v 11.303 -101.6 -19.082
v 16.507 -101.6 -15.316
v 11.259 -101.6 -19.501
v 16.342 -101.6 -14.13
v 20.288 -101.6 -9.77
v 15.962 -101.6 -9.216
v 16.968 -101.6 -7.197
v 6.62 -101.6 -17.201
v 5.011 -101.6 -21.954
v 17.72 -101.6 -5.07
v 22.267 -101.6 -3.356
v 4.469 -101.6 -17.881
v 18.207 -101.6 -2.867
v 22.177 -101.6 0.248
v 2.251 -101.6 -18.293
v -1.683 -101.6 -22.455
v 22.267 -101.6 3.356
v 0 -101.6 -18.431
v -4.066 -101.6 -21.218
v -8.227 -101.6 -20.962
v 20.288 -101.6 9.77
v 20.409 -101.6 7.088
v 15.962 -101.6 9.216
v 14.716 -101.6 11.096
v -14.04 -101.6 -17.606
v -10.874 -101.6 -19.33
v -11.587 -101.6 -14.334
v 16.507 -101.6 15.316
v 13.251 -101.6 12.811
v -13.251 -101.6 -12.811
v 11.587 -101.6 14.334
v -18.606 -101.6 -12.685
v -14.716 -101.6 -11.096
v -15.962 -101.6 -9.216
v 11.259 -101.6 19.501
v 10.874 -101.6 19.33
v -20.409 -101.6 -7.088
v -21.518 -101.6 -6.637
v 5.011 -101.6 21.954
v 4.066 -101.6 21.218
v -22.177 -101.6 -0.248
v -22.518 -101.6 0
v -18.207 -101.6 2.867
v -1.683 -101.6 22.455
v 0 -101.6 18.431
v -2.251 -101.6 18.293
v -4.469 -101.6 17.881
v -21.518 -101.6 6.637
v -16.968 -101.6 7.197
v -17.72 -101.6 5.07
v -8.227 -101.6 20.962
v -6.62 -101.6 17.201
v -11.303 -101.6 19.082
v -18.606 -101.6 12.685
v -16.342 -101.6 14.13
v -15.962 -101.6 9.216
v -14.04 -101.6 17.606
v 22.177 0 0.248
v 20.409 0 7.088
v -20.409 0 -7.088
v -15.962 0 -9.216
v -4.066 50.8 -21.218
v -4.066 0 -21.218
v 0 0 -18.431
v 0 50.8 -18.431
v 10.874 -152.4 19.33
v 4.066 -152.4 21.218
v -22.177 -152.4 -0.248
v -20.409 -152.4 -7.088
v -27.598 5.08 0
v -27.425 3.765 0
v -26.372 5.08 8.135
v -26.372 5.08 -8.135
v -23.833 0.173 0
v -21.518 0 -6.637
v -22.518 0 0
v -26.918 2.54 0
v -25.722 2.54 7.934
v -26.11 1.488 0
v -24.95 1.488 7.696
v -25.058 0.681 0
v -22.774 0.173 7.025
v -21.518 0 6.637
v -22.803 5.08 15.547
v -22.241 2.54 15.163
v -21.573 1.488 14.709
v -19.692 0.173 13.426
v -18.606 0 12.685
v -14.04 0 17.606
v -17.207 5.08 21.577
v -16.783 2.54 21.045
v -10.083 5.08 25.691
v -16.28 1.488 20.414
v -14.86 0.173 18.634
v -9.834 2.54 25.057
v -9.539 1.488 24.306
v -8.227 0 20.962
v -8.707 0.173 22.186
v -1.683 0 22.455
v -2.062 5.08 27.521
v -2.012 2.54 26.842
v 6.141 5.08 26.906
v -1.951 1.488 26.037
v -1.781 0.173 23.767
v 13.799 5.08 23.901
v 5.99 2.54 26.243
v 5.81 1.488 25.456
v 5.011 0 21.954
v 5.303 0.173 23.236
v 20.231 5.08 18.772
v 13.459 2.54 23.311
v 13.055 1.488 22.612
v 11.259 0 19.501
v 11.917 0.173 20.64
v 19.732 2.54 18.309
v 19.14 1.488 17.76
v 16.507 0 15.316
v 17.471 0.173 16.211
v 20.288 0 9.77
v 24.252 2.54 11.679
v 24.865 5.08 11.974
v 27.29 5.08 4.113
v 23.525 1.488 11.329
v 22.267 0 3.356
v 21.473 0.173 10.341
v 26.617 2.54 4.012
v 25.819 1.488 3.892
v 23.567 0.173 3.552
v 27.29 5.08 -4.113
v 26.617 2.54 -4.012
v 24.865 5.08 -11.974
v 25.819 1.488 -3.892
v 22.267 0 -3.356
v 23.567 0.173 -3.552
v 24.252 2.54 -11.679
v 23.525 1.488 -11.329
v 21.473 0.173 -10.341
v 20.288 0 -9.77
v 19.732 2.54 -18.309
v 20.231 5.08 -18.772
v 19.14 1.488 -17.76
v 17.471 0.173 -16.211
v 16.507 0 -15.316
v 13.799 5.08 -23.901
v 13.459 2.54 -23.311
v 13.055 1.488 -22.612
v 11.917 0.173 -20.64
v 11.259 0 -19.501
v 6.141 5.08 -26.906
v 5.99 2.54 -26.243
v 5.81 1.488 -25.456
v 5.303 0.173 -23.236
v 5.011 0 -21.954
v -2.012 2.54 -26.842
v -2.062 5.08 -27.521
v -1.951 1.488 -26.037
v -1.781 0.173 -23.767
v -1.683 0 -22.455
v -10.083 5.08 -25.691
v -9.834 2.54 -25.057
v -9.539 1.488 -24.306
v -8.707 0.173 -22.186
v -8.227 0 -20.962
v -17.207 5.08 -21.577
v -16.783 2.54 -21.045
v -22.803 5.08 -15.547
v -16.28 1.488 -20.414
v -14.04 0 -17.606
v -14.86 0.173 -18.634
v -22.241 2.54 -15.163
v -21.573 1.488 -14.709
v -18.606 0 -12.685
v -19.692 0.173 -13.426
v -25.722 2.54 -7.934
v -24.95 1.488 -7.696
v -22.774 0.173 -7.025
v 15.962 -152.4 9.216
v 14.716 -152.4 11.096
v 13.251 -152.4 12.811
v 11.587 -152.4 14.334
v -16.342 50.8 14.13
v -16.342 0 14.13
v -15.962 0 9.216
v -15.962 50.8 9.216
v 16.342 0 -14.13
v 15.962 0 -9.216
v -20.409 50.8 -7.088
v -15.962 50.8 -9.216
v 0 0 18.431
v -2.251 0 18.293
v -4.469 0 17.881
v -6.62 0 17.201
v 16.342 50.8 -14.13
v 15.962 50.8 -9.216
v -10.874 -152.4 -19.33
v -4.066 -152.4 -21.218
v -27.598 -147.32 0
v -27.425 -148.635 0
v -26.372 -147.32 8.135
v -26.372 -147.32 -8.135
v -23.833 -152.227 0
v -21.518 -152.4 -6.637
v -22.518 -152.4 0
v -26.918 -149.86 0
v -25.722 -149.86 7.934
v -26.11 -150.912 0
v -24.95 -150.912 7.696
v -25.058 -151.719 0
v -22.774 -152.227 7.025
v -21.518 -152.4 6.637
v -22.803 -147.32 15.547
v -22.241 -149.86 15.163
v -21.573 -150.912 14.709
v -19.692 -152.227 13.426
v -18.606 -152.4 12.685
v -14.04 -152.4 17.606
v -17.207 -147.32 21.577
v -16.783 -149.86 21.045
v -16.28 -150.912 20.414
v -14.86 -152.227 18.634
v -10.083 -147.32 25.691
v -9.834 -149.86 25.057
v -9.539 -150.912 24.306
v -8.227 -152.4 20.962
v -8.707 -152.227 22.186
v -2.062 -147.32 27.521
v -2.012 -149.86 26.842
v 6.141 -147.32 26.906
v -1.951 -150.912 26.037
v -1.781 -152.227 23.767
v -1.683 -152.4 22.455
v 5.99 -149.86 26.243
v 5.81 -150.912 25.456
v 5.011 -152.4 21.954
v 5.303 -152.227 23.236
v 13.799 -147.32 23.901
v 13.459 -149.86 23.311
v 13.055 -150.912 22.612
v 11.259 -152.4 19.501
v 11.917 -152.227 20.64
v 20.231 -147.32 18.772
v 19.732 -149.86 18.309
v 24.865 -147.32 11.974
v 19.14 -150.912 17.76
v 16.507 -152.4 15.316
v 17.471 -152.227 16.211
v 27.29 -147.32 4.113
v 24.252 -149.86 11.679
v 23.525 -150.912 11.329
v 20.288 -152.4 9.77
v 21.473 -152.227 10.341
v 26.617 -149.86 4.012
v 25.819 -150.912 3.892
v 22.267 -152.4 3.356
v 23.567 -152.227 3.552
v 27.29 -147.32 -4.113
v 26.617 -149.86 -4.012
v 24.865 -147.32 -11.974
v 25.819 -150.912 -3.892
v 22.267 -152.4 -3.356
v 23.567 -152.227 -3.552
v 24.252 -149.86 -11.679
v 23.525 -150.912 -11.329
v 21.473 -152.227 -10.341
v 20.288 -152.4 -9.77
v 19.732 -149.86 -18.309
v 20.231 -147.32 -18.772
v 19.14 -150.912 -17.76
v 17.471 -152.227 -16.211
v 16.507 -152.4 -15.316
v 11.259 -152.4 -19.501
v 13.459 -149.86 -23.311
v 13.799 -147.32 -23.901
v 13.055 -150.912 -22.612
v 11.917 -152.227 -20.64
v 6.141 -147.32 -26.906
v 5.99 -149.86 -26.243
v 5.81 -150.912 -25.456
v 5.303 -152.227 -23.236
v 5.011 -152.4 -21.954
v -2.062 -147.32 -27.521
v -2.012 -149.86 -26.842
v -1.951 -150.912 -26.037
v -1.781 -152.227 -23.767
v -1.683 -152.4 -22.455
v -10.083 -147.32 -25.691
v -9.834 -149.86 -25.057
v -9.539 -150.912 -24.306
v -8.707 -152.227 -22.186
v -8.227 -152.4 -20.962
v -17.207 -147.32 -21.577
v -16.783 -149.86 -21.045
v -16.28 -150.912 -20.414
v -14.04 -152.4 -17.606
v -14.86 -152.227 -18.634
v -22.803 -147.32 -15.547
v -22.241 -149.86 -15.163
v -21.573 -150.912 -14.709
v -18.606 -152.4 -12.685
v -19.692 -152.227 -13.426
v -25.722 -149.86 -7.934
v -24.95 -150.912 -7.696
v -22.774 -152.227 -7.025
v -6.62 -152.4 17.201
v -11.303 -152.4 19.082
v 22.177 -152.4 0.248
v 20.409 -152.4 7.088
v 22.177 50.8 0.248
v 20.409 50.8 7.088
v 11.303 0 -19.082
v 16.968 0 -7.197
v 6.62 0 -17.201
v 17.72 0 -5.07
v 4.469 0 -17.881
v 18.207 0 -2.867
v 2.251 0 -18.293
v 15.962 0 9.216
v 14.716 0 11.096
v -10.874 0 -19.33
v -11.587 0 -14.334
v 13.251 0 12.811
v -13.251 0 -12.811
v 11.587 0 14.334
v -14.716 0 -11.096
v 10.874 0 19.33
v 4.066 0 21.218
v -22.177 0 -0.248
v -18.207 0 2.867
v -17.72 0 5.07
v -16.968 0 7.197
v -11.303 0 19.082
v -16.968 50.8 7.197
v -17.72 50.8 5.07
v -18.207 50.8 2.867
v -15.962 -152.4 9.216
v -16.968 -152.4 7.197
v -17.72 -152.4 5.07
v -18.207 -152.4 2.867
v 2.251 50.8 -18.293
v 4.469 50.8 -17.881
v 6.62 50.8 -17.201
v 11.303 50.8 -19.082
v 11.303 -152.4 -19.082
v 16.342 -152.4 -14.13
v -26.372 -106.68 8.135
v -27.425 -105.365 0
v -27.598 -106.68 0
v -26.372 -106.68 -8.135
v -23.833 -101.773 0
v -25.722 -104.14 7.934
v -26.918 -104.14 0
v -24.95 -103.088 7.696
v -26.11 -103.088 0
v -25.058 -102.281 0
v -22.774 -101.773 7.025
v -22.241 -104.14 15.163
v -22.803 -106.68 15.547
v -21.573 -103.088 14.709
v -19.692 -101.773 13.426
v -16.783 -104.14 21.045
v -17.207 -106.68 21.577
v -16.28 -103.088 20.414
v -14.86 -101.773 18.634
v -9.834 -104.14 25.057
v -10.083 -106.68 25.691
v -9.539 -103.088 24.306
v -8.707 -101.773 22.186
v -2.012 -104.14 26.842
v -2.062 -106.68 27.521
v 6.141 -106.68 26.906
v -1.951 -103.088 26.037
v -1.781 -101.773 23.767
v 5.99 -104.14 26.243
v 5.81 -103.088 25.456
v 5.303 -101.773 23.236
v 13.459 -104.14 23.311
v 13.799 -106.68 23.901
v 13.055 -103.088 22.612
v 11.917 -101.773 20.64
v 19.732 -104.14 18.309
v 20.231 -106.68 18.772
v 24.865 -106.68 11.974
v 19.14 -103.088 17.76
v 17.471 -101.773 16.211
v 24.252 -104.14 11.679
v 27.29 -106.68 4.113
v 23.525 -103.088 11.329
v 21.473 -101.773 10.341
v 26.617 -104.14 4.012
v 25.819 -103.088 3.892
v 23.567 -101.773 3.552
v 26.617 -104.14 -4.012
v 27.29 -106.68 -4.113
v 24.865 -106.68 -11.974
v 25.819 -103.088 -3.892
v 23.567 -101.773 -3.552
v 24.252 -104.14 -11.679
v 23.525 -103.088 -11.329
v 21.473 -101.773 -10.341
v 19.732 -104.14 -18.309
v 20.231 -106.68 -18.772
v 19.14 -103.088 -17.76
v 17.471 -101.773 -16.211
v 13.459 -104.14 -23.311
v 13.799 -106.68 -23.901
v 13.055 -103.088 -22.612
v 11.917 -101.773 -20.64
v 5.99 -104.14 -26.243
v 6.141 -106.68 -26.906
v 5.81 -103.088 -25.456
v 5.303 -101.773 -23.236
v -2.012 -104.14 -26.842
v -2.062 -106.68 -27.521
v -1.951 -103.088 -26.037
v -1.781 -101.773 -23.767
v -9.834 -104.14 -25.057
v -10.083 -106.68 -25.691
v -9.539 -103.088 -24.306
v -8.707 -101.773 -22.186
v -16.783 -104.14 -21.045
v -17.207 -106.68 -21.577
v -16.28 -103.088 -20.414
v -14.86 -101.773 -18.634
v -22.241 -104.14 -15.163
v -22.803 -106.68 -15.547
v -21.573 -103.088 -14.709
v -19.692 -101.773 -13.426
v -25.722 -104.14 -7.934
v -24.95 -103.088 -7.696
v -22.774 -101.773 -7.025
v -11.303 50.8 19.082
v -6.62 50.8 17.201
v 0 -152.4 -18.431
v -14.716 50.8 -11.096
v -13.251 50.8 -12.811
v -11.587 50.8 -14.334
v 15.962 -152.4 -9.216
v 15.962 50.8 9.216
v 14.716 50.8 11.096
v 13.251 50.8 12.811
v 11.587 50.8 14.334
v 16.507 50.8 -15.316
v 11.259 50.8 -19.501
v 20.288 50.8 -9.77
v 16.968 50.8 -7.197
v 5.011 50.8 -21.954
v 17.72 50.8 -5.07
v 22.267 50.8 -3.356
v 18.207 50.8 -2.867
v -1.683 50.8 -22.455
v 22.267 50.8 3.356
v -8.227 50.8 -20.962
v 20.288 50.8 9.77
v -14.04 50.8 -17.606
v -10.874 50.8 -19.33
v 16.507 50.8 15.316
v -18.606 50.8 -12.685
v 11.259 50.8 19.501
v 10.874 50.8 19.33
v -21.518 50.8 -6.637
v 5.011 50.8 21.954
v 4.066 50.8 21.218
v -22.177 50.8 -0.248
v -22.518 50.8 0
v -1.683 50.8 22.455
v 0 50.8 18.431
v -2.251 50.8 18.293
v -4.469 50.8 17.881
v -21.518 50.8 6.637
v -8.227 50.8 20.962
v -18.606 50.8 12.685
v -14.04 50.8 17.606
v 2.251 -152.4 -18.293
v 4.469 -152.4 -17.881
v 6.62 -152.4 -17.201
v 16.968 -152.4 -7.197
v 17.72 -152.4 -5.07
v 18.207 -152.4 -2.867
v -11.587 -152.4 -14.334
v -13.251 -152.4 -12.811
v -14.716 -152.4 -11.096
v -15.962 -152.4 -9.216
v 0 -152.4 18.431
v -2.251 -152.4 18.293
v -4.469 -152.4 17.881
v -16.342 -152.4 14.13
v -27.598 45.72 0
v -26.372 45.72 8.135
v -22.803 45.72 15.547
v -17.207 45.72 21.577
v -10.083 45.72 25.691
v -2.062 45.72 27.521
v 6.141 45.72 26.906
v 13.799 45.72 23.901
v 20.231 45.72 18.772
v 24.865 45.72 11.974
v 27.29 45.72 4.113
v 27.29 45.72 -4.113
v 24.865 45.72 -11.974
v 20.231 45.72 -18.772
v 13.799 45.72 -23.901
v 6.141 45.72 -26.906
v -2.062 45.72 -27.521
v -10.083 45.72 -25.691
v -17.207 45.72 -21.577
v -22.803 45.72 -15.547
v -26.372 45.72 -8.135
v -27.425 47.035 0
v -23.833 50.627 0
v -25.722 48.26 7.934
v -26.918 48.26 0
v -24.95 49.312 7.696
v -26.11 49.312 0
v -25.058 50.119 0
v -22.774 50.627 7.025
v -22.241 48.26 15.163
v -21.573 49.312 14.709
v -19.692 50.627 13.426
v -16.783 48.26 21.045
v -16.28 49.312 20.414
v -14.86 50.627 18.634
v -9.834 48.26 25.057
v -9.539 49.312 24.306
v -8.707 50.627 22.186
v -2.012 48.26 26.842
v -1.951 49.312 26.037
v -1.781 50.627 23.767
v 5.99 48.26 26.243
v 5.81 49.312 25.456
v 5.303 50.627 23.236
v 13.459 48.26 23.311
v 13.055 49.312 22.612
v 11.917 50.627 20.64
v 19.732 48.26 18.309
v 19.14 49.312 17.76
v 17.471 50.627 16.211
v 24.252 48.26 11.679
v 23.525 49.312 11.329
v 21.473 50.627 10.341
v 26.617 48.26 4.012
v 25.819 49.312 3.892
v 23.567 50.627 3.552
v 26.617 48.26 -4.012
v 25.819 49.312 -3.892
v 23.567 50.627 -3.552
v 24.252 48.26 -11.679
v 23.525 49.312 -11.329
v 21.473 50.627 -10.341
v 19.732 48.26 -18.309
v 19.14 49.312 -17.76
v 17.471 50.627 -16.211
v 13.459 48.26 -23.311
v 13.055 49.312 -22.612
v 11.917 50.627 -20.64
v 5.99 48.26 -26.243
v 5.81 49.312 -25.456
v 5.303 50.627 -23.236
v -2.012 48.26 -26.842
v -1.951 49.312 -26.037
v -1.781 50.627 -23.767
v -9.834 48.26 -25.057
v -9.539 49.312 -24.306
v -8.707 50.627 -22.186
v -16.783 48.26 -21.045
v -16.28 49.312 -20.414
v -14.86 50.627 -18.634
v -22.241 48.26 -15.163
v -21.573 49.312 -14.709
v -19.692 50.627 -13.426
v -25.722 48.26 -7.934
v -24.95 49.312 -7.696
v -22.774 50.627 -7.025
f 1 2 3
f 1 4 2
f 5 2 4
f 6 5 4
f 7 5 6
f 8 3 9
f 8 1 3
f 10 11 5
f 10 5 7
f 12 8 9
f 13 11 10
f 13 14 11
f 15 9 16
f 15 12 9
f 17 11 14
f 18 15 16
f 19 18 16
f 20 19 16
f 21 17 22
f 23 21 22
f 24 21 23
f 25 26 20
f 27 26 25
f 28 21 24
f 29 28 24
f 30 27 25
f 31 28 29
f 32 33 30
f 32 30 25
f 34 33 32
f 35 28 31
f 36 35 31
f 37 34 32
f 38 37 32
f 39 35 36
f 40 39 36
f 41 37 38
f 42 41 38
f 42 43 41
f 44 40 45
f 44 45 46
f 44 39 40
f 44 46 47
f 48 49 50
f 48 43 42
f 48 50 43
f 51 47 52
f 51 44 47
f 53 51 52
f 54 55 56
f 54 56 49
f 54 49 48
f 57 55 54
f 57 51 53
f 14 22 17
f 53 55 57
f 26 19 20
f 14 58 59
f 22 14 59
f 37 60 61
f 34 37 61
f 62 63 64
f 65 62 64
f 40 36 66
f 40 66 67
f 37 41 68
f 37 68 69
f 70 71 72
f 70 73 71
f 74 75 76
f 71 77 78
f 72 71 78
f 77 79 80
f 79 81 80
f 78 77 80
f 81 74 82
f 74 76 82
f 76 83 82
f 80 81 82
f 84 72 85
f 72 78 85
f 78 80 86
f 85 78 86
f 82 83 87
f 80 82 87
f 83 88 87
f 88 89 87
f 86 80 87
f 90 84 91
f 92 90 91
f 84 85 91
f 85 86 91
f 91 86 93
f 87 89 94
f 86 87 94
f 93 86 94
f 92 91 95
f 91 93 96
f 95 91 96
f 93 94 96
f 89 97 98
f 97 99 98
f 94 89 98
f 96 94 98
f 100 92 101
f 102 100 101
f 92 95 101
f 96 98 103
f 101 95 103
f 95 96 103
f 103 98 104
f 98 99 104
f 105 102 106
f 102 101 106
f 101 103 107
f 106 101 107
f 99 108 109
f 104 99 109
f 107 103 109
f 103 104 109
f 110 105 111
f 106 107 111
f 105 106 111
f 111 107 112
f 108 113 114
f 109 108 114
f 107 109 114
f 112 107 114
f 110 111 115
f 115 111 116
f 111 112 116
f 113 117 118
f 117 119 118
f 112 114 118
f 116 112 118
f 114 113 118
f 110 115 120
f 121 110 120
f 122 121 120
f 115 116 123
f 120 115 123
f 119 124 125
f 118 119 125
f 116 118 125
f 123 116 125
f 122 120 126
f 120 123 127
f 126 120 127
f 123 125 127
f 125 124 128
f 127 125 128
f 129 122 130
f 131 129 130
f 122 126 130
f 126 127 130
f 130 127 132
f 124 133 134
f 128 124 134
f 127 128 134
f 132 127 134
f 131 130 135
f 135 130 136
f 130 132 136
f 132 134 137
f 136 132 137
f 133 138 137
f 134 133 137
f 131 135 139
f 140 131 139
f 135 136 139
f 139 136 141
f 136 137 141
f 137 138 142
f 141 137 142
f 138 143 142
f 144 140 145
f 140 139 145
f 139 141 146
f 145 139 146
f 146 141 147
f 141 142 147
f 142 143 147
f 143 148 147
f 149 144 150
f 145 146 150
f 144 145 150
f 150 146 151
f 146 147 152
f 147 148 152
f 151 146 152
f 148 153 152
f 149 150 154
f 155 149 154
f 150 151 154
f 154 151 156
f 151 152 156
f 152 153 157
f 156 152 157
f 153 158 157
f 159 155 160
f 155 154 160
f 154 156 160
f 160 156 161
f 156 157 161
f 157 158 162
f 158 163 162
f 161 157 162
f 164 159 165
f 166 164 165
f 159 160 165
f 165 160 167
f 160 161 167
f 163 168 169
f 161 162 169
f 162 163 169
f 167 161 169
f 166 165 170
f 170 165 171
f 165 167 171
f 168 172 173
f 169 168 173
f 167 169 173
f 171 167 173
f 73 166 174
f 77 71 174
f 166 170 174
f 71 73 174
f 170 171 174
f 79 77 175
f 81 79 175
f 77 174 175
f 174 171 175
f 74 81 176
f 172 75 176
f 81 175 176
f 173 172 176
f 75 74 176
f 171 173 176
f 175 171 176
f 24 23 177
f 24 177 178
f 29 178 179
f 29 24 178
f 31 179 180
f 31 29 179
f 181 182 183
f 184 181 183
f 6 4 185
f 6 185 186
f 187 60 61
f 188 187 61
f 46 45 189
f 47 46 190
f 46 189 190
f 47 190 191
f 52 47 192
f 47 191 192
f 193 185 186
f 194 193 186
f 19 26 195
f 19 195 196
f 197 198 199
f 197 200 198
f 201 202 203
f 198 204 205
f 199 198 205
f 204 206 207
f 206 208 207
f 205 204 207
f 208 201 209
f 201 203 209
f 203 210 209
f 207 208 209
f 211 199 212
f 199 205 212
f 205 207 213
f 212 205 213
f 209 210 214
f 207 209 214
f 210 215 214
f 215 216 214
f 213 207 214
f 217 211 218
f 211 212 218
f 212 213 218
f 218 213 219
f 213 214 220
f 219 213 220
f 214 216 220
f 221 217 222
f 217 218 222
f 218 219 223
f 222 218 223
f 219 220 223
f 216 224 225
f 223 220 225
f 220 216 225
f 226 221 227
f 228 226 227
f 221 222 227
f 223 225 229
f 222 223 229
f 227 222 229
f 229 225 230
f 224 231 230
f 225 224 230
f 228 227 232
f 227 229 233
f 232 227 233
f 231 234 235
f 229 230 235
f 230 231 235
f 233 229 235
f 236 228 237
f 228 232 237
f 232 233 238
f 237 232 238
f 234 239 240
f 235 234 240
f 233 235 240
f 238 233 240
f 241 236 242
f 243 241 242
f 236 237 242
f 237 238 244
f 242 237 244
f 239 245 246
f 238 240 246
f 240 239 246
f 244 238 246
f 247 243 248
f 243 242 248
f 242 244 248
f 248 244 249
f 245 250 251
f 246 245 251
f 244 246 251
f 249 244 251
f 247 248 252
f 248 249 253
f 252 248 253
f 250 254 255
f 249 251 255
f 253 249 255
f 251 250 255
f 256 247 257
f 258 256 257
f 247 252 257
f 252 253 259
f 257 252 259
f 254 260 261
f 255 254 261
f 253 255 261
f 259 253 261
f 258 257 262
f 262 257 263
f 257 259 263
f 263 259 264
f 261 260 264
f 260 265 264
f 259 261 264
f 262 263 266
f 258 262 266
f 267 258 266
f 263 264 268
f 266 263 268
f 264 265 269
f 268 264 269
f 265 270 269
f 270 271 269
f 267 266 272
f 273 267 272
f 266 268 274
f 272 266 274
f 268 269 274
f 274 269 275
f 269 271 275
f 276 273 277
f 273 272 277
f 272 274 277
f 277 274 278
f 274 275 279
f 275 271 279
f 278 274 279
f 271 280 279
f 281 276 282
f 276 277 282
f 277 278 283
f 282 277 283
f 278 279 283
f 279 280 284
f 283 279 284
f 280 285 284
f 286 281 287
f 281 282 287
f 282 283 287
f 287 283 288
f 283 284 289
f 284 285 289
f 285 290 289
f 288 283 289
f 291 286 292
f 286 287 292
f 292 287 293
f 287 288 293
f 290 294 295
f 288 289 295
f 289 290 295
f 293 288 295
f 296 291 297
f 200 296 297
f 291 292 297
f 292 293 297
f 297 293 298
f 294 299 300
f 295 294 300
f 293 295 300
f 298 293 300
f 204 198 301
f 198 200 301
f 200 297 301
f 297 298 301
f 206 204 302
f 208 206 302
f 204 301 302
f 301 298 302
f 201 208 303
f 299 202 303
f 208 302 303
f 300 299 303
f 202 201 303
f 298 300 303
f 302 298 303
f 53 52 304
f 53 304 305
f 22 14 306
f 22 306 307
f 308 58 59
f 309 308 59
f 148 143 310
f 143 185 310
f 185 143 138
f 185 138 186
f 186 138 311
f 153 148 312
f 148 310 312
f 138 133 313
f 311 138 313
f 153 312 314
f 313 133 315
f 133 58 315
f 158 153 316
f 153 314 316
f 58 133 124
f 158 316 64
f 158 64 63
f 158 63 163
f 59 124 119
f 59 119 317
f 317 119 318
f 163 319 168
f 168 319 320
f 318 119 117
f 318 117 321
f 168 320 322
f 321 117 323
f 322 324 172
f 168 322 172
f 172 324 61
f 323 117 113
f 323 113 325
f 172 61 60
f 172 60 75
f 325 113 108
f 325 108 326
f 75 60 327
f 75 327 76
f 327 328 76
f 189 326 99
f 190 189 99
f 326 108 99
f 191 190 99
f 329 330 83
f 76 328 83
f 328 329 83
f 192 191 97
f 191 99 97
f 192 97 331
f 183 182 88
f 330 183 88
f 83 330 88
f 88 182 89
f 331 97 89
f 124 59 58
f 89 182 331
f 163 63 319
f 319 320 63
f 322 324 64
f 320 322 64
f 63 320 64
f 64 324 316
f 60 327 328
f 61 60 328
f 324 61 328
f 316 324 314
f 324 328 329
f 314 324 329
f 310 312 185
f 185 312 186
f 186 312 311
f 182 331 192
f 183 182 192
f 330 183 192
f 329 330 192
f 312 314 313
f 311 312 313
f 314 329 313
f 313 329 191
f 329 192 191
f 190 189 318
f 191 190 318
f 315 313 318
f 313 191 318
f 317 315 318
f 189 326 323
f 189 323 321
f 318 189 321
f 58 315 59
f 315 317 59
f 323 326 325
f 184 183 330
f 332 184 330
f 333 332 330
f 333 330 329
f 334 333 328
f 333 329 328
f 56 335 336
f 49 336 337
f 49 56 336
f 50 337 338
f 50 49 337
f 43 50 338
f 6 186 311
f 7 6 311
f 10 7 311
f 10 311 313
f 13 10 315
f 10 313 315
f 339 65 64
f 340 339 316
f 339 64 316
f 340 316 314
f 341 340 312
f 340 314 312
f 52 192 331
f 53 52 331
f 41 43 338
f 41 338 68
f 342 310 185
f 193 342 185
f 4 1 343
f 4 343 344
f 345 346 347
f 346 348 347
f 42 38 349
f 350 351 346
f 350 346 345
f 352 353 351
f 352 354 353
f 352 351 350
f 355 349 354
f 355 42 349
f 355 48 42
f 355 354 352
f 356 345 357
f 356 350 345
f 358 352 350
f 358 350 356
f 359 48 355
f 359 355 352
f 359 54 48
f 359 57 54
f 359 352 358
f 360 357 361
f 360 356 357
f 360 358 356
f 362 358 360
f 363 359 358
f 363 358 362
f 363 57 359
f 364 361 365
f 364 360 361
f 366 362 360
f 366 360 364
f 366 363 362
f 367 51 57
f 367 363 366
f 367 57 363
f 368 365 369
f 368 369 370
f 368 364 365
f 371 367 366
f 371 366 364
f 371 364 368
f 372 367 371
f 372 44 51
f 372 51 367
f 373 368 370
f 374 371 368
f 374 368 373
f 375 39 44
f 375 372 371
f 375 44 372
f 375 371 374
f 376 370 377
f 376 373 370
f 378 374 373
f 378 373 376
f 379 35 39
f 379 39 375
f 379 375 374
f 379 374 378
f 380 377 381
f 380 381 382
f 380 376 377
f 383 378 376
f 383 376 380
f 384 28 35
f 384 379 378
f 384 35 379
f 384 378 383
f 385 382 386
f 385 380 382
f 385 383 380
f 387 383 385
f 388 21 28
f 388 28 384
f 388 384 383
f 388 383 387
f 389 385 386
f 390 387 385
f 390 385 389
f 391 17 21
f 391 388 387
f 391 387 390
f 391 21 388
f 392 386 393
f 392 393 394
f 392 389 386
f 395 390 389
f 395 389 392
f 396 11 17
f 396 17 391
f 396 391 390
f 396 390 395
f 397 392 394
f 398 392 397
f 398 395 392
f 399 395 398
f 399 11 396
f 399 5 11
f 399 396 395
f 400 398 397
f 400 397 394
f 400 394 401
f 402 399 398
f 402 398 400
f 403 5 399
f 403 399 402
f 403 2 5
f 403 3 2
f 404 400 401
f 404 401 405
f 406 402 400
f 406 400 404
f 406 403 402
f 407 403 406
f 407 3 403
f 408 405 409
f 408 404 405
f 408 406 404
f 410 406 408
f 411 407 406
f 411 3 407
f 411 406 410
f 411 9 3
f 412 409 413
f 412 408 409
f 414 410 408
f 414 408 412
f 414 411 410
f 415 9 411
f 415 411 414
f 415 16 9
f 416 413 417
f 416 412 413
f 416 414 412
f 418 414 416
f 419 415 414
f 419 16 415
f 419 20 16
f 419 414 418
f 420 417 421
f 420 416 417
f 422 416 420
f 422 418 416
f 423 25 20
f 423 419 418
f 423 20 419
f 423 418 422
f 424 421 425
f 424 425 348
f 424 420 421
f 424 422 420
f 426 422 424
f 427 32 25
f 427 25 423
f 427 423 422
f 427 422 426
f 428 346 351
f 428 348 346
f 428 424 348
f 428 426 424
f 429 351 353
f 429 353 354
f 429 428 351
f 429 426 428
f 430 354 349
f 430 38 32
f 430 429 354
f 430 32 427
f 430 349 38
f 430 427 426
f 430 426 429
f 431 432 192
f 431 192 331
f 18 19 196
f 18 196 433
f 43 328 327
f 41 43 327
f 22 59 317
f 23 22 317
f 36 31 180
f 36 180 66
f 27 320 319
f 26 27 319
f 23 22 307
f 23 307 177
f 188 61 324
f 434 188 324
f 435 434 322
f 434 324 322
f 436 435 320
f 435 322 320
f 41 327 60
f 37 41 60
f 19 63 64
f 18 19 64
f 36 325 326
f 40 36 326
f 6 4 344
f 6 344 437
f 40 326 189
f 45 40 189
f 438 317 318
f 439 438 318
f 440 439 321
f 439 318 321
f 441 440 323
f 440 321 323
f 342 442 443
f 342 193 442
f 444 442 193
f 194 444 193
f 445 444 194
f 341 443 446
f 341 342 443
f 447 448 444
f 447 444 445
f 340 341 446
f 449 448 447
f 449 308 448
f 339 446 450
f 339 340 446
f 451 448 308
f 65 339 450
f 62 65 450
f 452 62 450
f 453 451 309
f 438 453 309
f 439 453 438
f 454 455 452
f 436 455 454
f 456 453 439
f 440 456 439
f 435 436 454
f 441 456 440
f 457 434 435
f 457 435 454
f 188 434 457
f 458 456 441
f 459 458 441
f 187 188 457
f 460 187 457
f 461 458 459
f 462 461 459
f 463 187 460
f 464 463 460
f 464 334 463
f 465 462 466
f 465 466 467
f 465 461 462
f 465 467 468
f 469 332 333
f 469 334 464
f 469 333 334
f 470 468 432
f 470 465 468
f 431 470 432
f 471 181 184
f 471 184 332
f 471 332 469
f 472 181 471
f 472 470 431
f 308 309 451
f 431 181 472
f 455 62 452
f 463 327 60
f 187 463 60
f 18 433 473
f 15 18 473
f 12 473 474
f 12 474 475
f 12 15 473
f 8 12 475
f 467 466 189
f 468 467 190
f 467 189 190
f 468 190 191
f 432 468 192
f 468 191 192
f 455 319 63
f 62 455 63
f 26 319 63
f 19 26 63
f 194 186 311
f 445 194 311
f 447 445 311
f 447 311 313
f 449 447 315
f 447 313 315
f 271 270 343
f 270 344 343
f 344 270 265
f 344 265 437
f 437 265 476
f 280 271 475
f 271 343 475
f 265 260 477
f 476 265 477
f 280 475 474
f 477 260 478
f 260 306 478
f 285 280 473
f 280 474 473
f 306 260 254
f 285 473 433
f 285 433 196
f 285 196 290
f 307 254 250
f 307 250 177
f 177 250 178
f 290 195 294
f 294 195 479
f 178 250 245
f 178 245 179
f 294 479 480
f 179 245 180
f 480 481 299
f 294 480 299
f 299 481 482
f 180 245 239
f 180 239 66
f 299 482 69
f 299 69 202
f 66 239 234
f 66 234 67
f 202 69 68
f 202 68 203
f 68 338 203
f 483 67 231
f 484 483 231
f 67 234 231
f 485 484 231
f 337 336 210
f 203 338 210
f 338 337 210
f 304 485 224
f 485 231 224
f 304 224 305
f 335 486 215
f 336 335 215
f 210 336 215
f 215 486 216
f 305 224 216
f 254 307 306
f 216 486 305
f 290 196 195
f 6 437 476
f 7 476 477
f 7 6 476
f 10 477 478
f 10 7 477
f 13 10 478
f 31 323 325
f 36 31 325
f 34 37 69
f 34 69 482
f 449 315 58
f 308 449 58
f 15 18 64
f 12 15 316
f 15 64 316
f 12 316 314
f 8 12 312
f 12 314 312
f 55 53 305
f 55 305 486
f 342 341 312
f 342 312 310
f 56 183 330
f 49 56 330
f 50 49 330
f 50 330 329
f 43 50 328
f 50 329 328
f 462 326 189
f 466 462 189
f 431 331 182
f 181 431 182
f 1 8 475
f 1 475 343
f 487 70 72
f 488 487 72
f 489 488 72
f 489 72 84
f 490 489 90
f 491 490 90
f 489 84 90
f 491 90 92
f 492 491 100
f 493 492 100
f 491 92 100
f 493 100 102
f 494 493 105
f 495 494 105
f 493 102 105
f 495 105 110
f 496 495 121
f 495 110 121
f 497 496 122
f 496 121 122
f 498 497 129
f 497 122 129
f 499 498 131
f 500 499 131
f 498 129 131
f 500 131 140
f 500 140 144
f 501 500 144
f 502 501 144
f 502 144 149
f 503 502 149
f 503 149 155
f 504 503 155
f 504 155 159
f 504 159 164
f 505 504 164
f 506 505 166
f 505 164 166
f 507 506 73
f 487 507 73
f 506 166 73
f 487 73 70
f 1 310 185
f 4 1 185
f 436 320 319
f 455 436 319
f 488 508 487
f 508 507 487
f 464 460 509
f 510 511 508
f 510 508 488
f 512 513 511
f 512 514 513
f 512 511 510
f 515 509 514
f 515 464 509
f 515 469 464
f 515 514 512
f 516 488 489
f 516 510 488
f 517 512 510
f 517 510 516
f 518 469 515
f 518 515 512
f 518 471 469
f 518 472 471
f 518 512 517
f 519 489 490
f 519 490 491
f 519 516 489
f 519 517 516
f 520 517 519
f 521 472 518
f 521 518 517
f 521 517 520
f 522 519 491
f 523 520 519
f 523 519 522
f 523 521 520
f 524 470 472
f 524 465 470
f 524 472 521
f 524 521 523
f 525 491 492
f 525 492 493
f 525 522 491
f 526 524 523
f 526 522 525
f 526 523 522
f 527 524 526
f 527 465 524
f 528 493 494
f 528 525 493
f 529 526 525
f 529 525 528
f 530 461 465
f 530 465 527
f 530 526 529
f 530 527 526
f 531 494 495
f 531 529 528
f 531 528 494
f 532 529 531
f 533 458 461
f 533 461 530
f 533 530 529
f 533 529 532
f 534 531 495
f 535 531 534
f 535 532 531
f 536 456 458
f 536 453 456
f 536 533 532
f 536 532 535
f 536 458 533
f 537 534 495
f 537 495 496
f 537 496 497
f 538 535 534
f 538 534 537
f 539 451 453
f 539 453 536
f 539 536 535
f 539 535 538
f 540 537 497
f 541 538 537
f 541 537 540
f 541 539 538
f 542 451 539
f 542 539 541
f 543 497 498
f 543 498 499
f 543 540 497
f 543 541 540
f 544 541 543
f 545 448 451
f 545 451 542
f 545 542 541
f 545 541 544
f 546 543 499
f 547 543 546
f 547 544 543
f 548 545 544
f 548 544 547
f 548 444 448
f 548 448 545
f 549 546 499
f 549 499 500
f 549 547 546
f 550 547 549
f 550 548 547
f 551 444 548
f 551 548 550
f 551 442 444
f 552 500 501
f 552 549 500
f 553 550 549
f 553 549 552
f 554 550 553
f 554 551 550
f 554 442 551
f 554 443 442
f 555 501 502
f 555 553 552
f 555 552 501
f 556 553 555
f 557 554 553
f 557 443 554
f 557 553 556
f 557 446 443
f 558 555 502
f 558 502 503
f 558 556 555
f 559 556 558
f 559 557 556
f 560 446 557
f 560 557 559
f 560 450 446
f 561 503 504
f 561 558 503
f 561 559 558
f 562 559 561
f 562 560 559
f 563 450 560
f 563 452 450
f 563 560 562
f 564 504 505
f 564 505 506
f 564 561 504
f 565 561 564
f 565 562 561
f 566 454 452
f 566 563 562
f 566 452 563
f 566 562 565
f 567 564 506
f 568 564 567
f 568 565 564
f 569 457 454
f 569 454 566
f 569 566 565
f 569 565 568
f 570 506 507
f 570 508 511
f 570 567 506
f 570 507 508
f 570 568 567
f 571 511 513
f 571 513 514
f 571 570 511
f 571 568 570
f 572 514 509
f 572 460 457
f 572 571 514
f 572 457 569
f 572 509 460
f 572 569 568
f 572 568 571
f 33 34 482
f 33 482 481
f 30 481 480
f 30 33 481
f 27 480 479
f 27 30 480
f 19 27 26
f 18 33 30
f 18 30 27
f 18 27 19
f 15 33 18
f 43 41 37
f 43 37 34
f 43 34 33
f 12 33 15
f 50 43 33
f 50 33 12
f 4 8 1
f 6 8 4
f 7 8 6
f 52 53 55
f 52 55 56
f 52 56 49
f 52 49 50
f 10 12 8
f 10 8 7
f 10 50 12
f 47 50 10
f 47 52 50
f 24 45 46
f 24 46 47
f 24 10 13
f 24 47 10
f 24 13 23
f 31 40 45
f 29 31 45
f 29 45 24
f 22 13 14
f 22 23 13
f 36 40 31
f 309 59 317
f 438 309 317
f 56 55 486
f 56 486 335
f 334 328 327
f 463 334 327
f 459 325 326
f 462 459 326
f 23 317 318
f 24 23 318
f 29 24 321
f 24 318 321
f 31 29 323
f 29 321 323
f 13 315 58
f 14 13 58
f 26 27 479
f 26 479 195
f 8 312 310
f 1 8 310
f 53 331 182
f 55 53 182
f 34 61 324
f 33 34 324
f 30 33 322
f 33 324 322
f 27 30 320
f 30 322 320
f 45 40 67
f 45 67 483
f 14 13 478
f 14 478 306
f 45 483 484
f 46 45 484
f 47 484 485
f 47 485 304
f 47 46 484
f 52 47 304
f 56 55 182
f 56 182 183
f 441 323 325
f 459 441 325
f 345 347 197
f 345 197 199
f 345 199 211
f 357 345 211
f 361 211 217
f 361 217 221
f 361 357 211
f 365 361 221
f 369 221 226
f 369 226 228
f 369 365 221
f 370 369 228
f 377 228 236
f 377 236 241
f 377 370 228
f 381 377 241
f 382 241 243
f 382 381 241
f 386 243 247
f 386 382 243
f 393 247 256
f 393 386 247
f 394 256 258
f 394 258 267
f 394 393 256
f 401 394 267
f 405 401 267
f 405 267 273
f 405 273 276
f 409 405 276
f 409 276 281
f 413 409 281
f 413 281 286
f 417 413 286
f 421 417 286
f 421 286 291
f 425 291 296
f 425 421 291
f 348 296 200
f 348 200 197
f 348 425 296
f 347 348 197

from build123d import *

# Parameters (mm, degrees)
F1_DEPTH = 101.6
F2_R     = 27.598358
F3_DEPTH = 50.8
F4_R     = 5.08


with BuildPart() as f1:
    # F0 (on Front) → F1 (new body)
    with BuildSketch(Plane.XZ):
        with BuildLine():
            ThreePointArc((18.206637, -2.867422), (18.374864, -1.438095), (18.431054, 0))
            ThreePointArc((18.431054, 0), (17.803031, 4.770308), (15.961761, 9.215527))
            ThreePointArc((15.961761, 9.215527), (14.009878, 11.976104), (11.586579, 14.3337))
            ThreePointArc((11.586579, 14.3337), (6.144858, 17.376549), (0, 18.431054))
            ThreePointArc((0, 18.431054), (-3.366672, 18.120962), (-6.620059, 17.201121))
            ThreePointArc((-6.620059, 17.201121), (-11.976104, 14.009878), (-15.961761, 9.215527))
            ThreePointArc((-15.961761, 9.215527), (-17.376549, 6.144858), (-18.206637, 2.867422))
            ThreePointArc((-18.206637, 2.867422), (-18.120962, -3.366672), (-15.961761, -9.215527))
            ThreePointArc((-15.961761, -9.215527), (-14.009878, -11.976104), (-11.586579, -14.3337))
            ThreePointArc((-11.586579, -14.3337), (-6.144858, -17.376549), (0, -18.431054))
            ThreePointArc((0, -18.431054), (3.366672, -18.120962), (6.620059, -17.201121))
            ThreePointArc((6.620059, -17.201121), (11.976104, -14.009878), (15.961761, -9.215527))
            ThreePointArc((15.961761, -9.215527), (17.376549, -6.144858), (18.206637, -2.867422))
        make_face()
        with BuildLine():
            ThreePointArc((15.961761, 9.215527), (17.803031, 4.770308), (18.431054, 0))
            ThreePointArc((18.431054, 0), (18.374864, -1.438095), (18.206637, -2.867422))
            Line((18.206637, -2.867422), (22.177325, 0.248))
            Line((22.177325, 0.248), (20.40857, 7.087775))
            Line((20.40857, 7.087775), (15.961761, 9.215527))
        make_face()
        with BuildLine():
            ThreePointArc((0, 18.431054), (6.144858, 17.376549), (11.586579, 14.3337))
            Line((11.586579, 14.3337), (10.873889, 19.330127))
            Line((10.873889, 19.330127), (4.066092, 21.218227))
            Line((4.066092, 21.218227), (0, 18.431054))
        make_face()
        with BuildLine():
            Line((16.342478, -14.130453), (15.961761, -9.215527))
            ThreePointArc((15.961761, -9.215527), (11.976104, -14.009878), (6.620059, -17.201121))
            Line((6.620059, -17.201121), (11.303437, -19.082127))
            Line((11.303437, -19.082127), (16.342478, -14.130453))
        make_face()
        with BuildLine():
            ThreePointArc((-15.961761, 9.215527), (-11.976104, 14.009878), (-6.620059, 17.201121))
            Line((-6.620059, 17.201121), (-11.303437, 19.082127))
            Line((-11.303437, 19.082127), (-16.342478, 14.130453))
            Line((-16.342478, 14.130453), (-15.961761, 9.215527))
        make_face()
        with BuildLine():
            Line((-4.066092, -21.218227), (0, -18.431054))
            ThreePointArc((0, -18.431054), (-6.144858, -17.376549), (-11.586579, -14.3337))
            Line((-11.586579, -14.3337), (-10.873889, -19.330127))
            Line((-10.873889, -19.330127), (-4.066092, -21.218227))
        make_face()
        with BuildLine():
            ThreePointArc((-15.961761, -9.215527), (-18.120962, -3.366672), (-18.206637, 2.867422))
            Line((-18.206637, 2.867422), (-22.177325, -0.248))
            Line((-22.177325, -0.248), (-20.40857, -7.087775))
            Line((-20.40857, -7.087775), (-15.961761, -9.215527))
        make_face()
    extrude(amount=F1_DEPTH)


with BuildPart() as f3:
    # F2 (on face) → F3 (new body)
    with BuildSketch(Plane(origin=(0, 0, 0), x_dir=(-1, 0, 0), z_dir=(0, 1, 0))):
        Circle(F2_R)
        with BuildLine():
            Line((-18.206637, -2.867422), (-22.177325, 0.248))
            Line((-22.177325, 0.248), (-20.40857, 7.087775))
            Line((-20.40857, 7.087775), (-15.961761, 9.215527))
            ThreePointArc((-15.961761, 9.215527), (-14.009878, 11.976104), (-11.586579, 14.3337))
            Line((-11.586579, 14.3337), (-10.873889, 19.330127))
            Line((-10.873889, 19.330127), (-4.066092, 21.218227))
            Line((-4.066092, 21.218227), (0, 18.431054))
            ThreePointArc((0, 18.431054), (3.366672, 18.120962), (6.620059, 17.201121))
            Line((6.620059, 17.201121), (11.303437, 19.082127))
            Line((11.303437, 19.082127), (16.342478, 14.130453))
            Line((16.342478, 14.130453), (15.961761, 9.215527))
            ThreePointArc((15.961761, 9.215527), (17.376549, 6.144858), (18.206637, 2.867422))
            Line((18.206637, 2.867422), (22.177325, -0.248))
            Line((22.177325, -0.248), (20.40857, -7.087775))
            Line((20.40857, -7.087775), (15.961761, -9.215527))
            ThreePointArc((15.961761, -9.215527), (14.009878, -11.976104), (11.586579, -14.3337))
            Line((11.586579, -14.3337), (10.873889, -19.330127))
            Line((10.873889, -19.330127), (4.066092, -21.218227))
            Line((4.066092, -21.218227), (0, -18.431054))
            ThreePointArc((0, -18.431054), (-3.366672, -18.120962), (-6.620059, -17.201121))
            Line((-6.620059, -17.201121), (-11.303437, -19.082127))
            Line((-11.303437, -19.082127), (-16.342478, -14.130453))
            Line((-16.342478, -14.130453), (-15.961761, -9.215527))
            ThreePointArc((-15.961761, -9.215527), (-17.376549, -6.144858), (-18.206637, -2.867422))
        make_face(mode=Mode.SUBTRACT)
    extrude(amount=F3_DEPTH)

    # F4
    f4_edges = [f3.edges().sort_by_distance(p)[0] for p in [
        (-27.598358, 25.4, 0),
        (27.598358, 0, 0),
        (27.598358, 50.8, 0),
    ]]
    fillet(f4_edges, radius=F4_R)


with BuildPart() as f6_1:
    # F6: instance of F3
    add(f3.part.mirror(Plane.XZ.offset(50.8)))


solid = Compound([f1.part, f3.part, f6_1.part])
